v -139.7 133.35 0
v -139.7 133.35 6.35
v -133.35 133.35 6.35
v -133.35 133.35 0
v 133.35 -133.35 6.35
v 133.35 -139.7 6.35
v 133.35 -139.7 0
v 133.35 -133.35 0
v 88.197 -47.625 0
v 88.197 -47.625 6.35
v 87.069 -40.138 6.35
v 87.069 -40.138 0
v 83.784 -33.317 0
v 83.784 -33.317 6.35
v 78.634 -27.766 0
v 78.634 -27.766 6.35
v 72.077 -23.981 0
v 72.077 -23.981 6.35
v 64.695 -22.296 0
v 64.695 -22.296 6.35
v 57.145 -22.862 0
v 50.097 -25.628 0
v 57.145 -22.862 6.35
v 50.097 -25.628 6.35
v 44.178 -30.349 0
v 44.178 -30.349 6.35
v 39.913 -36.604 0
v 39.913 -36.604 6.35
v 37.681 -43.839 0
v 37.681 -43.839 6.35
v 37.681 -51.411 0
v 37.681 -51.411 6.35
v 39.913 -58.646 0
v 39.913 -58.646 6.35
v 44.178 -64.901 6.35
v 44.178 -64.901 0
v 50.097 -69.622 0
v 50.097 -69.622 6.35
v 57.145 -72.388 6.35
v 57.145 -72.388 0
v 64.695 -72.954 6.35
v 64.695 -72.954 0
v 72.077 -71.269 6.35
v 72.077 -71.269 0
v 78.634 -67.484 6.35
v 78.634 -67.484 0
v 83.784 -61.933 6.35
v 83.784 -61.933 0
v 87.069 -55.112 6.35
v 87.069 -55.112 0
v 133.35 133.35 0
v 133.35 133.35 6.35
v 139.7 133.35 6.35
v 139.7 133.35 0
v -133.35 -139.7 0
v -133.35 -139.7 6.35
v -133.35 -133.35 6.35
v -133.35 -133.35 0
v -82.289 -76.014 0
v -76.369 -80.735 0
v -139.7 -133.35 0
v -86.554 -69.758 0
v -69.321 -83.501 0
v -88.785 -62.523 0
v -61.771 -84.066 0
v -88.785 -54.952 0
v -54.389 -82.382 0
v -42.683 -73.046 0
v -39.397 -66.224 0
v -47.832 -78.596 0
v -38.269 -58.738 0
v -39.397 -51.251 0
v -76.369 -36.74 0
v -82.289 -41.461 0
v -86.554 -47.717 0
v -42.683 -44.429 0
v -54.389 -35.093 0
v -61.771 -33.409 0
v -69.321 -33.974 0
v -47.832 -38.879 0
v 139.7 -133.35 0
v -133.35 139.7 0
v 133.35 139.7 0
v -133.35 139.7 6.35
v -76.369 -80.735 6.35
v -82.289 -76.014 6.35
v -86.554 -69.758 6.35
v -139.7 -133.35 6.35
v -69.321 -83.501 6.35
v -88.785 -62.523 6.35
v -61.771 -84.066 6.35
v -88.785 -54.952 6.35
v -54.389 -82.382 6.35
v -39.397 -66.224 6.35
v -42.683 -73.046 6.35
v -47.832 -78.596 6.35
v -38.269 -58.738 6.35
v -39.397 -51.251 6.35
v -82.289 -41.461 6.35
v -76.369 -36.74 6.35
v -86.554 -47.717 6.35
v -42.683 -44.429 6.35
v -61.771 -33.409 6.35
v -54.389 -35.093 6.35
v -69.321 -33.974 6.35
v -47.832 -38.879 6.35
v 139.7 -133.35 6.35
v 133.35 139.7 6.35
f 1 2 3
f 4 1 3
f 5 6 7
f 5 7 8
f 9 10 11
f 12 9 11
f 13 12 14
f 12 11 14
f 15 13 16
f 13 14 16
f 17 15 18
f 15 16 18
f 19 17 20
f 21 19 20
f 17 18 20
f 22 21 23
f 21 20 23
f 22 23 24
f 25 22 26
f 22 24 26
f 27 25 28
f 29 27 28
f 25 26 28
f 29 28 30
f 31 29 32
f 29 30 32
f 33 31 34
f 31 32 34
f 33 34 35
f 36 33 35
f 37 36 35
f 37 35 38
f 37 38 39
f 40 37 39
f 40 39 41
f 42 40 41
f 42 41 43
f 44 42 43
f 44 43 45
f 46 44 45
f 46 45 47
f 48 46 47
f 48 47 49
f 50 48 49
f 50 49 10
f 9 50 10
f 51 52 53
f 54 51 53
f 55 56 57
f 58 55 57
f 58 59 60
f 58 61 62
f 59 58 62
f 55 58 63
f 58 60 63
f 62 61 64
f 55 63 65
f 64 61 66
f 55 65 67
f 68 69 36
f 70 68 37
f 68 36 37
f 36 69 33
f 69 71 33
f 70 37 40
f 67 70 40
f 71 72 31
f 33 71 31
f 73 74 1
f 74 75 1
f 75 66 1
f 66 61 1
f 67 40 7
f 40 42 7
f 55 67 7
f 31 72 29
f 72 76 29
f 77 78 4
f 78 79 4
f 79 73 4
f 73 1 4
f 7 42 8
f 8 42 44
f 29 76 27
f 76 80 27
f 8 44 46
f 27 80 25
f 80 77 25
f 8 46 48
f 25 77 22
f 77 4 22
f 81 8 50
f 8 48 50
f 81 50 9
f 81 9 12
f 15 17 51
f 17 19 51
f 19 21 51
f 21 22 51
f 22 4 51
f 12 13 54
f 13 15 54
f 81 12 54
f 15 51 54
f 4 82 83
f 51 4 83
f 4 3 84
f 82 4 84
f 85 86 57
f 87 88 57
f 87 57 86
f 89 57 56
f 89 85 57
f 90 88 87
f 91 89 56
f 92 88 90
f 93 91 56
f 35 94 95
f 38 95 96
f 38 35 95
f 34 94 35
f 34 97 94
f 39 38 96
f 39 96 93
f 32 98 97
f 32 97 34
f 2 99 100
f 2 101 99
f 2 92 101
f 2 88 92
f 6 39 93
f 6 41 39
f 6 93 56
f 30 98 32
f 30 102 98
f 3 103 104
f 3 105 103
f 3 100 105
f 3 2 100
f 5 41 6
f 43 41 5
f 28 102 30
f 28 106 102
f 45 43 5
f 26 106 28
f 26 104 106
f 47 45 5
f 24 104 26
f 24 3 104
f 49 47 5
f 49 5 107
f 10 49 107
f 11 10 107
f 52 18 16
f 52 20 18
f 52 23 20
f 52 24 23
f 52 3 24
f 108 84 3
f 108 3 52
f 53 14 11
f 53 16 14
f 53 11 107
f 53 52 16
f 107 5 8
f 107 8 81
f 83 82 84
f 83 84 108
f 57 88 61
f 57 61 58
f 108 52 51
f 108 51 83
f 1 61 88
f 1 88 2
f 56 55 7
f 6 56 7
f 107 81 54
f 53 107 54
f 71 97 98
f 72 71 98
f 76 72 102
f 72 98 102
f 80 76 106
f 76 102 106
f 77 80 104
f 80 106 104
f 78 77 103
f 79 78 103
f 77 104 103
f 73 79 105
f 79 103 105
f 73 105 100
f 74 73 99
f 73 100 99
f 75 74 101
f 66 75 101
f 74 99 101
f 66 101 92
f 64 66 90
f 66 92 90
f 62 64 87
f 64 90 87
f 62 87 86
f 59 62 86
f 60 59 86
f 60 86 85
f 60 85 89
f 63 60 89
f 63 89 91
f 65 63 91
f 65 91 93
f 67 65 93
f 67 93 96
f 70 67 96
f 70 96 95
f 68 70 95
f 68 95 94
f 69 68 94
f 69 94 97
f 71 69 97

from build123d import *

# Parameters (mm, degrees)
SKETCH1_W           = 279.4
SKETCH1_H           = 279.4
BOSS_EXTRUDE1_DEPTH = 6.35
SKETCH3_R           = 25.4
CUT_EXTRUDE2_DEPTH  = 198.667656687
SKETCH4_W           = 6.35
SKETCH4_H           = 6.35
CUT_EXTRUDE3_DEPTH  = 198.667656687


with BuildPart() as part:
    # Sketch1 → Boss-Extrude1 (new body)
    with BuildSketch(Plane.XY):
        Rectangle(SKETCH1_W, SKETCH1_H)
    extrude(amount=BOSS_EXTRUDE1_DEPTH)

    # Sketch3 → Cut-Extrude2 (cut, through all)
    with BuildSketch(Plane.XY.offset(6.35)):
        with Locations((-63.668986787, -58.7375)):
            Circle(SKETCH3_R)
        with Locations((62.797291543, -47.625)):
            Circle(SKETCH3_R)
    extrude(amount=-CUT_EXTRUDE2_DEPTH, mode=Mode.SUBTRACT)

    # Sketch4 → Cut-Extrude3 (cut, through all)
    with BuildSketch(Plane.XY.offset(6.35)):
        with Locations((-136.525, 136.525)):
            Rectangle(SKETCH4_W, SKETCH4_H)
        with Locations((136.525, 136.525)):
            Rectangle(SKETCH4_W, SKETCH4_H)
        with Locations((136.525, -136.525)):
            Rectangle(SKETCH4_W, SKETCH4_H)
        with Locations((-136.525, -136.525)):
            Rectangle(SKETCH4_W, SKETCH4_H)
    extrude(amount=-CUT_EXTRUDE3_DEPTH, mode=Mode.SUBTRACT)


solid = part.part
